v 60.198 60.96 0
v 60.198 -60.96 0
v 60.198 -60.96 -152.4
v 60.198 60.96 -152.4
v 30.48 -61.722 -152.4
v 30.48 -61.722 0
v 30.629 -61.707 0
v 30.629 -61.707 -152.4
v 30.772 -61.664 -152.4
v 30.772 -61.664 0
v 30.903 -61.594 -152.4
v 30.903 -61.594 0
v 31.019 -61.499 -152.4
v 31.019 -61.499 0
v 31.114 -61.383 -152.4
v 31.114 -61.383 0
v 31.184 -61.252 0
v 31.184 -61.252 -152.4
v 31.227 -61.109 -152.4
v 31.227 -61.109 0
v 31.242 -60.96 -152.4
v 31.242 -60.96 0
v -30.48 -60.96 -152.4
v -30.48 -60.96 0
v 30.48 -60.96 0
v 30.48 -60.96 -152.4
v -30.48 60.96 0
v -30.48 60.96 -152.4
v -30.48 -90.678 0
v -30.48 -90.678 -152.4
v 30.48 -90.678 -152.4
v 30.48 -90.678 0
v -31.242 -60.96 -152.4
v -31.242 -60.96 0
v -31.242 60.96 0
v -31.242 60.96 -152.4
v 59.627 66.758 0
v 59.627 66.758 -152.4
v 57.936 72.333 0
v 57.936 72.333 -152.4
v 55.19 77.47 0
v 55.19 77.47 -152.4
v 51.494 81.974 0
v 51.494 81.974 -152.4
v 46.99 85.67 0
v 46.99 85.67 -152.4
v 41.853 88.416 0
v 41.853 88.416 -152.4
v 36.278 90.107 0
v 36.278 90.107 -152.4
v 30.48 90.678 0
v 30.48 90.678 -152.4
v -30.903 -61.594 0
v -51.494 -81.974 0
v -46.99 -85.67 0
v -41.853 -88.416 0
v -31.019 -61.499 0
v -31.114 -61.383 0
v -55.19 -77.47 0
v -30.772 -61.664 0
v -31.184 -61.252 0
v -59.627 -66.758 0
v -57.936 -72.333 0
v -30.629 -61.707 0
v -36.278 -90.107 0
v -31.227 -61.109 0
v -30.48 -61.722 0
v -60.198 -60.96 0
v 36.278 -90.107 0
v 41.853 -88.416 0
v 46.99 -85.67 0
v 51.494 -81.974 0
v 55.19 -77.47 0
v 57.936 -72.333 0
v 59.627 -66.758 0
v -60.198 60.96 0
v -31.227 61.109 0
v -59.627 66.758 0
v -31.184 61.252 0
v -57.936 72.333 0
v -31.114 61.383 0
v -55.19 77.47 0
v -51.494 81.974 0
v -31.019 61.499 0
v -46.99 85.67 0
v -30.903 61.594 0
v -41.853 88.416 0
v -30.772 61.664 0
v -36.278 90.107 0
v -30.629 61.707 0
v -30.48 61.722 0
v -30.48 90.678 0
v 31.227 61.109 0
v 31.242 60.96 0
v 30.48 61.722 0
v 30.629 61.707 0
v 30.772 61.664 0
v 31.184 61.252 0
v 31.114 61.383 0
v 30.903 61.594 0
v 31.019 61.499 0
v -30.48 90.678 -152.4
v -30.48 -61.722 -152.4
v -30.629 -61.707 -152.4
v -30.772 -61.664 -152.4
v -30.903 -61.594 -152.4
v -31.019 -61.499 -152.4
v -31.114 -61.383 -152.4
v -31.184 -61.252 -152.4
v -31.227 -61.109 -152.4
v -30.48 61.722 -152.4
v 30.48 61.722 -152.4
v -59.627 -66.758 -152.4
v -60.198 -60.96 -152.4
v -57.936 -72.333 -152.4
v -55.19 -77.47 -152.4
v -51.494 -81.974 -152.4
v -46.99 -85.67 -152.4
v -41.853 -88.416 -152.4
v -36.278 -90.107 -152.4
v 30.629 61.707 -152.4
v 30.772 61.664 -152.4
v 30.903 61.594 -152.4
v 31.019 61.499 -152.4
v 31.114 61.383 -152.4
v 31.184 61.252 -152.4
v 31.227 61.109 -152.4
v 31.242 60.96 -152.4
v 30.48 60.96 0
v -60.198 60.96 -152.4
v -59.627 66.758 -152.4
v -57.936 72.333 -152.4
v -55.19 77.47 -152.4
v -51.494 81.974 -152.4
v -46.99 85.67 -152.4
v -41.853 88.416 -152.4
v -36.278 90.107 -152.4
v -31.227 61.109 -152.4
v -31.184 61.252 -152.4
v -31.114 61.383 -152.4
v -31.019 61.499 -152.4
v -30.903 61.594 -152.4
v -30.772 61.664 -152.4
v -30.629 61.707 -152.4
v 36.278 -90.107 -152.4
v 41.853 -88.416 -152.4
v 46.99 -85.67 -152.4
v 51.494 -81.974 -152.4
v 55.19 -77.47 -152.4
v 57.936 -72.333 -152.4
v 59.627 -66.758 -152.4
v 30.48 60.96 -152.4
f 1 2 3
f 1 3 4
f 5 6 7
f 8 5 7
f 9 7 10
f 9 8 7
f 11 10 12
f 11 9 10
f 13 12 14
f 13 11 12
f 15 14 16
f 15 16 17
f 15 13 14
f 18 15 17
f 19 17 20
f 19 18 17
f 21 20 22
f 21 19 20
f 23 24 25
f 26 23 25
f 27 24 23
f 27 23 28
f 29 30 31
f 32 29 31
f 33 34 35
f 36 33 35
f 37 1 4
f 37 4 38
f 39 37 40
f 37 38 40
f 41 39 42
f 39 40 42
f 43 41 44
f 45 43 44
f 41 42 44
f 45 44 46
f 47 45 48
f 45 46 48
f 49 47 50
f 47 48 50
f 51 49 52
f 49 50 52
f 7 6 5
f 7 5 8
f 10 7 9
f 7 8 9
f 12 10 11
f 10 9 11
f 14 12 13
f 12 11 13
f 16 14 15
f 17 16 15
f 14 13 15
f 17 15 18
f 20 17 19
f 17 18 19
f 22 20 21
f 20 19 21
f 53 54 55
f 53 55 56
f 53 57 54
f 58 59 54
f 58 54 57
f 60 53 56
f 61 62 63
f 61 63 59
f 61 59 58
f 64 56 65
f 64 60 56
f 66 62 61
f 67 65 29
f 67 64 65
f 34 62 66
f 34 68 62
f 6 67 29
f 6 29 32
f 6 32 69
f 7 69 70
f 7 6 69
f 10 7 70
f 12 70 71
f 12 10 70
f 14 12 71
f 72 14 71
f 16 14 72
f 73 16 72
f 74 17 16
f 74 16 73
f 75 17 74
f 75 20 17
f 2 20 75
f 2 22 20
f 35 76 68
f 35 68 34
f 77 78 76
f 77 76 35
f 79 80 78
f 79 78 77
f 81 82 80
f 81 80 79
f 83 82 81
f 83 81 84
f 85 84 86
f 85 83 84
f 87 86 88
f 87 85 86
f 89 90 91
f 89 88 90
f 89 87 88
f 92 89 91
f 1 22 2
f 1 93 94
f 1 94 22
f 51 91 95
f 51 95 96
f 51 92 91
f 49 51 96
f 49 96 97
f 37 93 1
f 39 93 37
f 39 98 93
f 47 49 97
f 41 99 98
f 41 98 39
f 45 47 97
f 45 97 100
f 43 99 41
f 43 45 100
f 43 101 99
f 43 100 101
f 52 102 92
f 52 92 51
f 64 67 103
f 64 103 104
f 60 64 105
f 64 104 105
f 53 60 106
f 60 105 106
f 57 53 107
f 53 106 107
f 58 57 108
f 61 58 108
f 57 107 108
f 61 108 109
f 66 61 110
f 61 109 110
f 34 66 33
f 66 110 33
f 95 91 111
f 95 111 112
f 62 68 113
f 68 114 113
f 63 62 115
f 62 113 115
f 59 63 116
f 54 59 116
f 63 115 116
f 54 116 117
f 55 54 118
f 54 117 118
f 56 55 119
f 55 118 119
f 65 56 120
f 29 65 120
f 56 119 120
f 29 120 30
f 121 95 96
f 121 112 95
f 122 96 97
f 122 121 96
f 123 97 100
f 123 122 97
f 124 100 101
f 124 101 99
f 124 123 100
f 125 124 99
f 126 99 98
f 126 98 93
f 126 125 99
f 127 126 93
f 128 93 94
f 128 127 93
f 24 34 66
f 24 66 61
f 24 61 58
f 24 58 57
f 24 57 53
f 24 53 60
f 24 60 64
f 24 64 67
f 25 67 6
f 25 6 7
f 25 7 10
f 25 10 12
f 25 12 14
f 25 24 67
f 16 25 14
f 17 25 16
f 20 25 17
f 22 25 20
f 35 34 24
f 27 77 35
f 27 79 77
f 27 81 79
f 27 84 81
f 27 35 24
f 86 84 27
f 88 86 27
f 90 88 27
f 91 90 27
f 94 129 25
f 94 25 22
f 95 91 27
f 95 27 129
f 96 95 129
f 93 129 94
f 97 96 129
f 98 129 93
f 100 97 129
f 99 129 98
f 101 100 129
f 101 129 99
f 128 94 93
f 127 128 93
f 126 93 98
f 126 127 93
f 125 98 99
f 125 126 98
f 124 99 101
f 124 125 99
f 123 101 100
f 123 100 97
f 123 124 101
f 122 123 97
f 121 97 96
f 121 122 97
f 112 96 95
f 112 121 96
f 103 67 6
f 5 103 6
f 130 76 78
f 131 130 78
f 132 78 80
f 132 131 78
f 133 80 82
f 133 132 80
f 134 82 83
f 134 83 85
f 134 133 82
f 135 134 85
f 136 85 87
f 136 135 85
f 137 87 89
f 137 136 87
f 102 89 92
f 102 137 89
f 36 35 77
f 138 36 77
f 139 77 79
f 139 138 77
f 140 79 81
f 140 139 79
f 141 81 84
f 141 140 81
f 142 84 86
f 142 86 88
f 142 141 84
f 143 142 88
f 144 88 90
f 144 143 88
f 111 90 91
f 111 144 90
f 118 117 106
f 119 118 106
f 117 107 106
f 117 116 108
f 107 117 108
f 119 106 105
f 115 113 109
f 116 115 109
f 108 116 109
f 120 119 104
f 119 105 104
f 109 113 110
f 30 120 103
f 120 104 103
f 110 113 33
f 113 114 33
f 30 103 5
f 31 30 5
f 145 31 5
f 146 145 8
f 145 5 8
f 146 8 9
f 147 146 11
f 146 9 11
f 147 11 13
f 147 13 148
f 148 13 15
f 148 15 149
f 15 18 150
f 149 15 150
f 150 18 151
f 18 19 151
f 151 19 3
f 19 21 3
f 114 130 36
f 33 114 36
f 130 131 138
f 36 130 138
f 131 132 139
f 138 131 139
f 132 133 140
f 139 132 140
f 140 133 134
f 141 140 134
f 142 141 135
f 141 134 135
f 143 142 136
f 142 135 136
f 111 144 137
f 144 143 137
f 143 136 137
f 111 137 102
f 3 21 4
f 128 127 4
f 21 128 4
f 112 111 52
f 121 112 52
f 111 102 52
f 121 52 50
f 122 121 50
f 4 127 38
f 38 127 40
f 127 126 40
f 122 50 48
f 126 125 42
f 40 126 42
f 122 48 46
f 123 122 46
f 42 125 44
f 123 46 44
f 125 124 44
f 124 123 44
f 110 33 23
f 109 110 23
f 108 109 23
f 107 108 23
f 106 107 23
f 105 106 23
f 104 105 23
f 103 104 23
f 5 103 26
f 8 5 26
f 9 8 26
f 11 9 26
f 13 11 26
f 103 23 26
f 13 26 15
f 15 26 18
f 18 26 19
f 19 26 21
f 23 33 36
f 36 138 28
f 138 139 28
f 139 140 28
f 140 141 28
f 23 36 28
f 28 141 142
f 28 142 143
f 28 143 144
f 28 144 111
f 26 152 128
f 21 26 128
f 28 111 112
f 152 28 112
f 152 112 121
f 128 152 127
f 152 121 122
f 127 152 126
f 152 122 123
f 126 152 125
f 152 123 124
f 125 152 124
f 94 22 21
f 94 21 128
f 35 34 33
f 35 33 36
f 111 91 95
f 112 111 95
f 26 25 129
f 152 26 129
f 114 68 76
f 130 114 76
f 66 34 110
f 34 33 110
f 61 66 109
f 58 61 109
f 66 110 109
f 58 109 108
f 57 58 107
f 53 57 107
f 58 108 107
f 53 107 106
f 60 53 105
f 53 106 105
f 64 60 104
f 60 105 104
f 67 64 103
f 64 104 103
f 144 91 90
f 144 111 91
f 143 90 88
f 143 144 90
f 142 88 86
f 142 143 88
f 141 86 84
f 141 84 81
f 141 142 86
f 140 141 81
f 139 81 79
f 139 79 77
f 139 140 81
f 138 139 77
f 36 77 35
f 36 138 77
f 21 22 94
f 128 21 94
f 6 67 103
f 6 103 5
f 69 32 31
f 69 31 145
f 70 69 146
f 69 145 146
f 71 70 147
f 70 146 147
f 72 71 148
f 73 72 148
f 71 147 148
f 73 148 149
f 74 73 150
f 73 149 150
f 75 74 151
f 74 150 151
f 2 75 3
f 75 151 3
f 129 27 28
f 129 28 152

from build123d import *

# Parameters (mm, degrees)
F4_W      = 120.396
F4_H      = 181.356
F5_DEPTH  = 152.4
F6_R      = 29.718
F7_W      = 62.484
F7_H      = 123.444
F8_DEPTH  = 152.4
F9_W      = 62.484
F9_H      = 123.444
F10_DEPTH = 152.4
F11_W     = 60.96
F11_H     = 121.92
F12_DEPTH = 152.4
F13_R     = 0.762
F14_R     = 0.762


with BuildPart() as f5:
    # F4 (on Top) → F5 (new body)
    with BuildSketch(Plane.XY):
        Rectangle(F4_W, F4_H)
    extrude(amount=-F5_DEPTH)

    # F6
    f6_edges = [f5.edges().sort_by_distance(p)[0] for p in [
        (-60.198, 90.678, -76.2),
        (60.198, 90.678, -76.2),
        (60.198, -90.678, -76.2),
        (-60.198, -90.678, -76.2),
    ]]
    fillet(f6_edges, radius=F6_R)

    # F7 (on face) → F8 (cut)
    with BuildSketch(Plane.XY):
        Rectangle(F7_W, F7_H)
    extrude(amount=-F8_DEPTH, mode=Mode.SUBTRACT)

    # F14
    f14_edges = [f5.edges().sort_by_distance(p)[0] for p in [
        (-31.242, 61.722, -76.2),
        (-31.242, -61.722, -76.2),
        (31.242, -61.722, -76.2),
        (31.242, 61.722, -76.2),
    ]]
    fillet(f14_edges, radius=F14_R)


with BuildPart() as f10:
    # F9 (on face) → F10 (new body)
    with BuildSketch(Plane.XY):
        Rectangle(F9_W, F9_H)
    extrude(amount=-F10_DEPTH)

    # F11 (on face) → F12 (cut)
    with BuildSketch(Plane.XY):
        Rectangle(F11_W, F11_H)
    extrude(amount=-F12_DEPTH, mode=Mode.SUBTRACT)

    # F13
    f13_edges = [f10.edges().sort_by_distance(p)[0] for p in [
        (-31.242, 61.722, -76.2),
        (31.242, 61.722, -76.2),
        (31.242, -61.722, -76.2),
        (-31.242, -61.722, -76.2),
    ]]
    fillet(f13_edges, radius=F13_R)


solid = Compound([f5.part, f10.part])
